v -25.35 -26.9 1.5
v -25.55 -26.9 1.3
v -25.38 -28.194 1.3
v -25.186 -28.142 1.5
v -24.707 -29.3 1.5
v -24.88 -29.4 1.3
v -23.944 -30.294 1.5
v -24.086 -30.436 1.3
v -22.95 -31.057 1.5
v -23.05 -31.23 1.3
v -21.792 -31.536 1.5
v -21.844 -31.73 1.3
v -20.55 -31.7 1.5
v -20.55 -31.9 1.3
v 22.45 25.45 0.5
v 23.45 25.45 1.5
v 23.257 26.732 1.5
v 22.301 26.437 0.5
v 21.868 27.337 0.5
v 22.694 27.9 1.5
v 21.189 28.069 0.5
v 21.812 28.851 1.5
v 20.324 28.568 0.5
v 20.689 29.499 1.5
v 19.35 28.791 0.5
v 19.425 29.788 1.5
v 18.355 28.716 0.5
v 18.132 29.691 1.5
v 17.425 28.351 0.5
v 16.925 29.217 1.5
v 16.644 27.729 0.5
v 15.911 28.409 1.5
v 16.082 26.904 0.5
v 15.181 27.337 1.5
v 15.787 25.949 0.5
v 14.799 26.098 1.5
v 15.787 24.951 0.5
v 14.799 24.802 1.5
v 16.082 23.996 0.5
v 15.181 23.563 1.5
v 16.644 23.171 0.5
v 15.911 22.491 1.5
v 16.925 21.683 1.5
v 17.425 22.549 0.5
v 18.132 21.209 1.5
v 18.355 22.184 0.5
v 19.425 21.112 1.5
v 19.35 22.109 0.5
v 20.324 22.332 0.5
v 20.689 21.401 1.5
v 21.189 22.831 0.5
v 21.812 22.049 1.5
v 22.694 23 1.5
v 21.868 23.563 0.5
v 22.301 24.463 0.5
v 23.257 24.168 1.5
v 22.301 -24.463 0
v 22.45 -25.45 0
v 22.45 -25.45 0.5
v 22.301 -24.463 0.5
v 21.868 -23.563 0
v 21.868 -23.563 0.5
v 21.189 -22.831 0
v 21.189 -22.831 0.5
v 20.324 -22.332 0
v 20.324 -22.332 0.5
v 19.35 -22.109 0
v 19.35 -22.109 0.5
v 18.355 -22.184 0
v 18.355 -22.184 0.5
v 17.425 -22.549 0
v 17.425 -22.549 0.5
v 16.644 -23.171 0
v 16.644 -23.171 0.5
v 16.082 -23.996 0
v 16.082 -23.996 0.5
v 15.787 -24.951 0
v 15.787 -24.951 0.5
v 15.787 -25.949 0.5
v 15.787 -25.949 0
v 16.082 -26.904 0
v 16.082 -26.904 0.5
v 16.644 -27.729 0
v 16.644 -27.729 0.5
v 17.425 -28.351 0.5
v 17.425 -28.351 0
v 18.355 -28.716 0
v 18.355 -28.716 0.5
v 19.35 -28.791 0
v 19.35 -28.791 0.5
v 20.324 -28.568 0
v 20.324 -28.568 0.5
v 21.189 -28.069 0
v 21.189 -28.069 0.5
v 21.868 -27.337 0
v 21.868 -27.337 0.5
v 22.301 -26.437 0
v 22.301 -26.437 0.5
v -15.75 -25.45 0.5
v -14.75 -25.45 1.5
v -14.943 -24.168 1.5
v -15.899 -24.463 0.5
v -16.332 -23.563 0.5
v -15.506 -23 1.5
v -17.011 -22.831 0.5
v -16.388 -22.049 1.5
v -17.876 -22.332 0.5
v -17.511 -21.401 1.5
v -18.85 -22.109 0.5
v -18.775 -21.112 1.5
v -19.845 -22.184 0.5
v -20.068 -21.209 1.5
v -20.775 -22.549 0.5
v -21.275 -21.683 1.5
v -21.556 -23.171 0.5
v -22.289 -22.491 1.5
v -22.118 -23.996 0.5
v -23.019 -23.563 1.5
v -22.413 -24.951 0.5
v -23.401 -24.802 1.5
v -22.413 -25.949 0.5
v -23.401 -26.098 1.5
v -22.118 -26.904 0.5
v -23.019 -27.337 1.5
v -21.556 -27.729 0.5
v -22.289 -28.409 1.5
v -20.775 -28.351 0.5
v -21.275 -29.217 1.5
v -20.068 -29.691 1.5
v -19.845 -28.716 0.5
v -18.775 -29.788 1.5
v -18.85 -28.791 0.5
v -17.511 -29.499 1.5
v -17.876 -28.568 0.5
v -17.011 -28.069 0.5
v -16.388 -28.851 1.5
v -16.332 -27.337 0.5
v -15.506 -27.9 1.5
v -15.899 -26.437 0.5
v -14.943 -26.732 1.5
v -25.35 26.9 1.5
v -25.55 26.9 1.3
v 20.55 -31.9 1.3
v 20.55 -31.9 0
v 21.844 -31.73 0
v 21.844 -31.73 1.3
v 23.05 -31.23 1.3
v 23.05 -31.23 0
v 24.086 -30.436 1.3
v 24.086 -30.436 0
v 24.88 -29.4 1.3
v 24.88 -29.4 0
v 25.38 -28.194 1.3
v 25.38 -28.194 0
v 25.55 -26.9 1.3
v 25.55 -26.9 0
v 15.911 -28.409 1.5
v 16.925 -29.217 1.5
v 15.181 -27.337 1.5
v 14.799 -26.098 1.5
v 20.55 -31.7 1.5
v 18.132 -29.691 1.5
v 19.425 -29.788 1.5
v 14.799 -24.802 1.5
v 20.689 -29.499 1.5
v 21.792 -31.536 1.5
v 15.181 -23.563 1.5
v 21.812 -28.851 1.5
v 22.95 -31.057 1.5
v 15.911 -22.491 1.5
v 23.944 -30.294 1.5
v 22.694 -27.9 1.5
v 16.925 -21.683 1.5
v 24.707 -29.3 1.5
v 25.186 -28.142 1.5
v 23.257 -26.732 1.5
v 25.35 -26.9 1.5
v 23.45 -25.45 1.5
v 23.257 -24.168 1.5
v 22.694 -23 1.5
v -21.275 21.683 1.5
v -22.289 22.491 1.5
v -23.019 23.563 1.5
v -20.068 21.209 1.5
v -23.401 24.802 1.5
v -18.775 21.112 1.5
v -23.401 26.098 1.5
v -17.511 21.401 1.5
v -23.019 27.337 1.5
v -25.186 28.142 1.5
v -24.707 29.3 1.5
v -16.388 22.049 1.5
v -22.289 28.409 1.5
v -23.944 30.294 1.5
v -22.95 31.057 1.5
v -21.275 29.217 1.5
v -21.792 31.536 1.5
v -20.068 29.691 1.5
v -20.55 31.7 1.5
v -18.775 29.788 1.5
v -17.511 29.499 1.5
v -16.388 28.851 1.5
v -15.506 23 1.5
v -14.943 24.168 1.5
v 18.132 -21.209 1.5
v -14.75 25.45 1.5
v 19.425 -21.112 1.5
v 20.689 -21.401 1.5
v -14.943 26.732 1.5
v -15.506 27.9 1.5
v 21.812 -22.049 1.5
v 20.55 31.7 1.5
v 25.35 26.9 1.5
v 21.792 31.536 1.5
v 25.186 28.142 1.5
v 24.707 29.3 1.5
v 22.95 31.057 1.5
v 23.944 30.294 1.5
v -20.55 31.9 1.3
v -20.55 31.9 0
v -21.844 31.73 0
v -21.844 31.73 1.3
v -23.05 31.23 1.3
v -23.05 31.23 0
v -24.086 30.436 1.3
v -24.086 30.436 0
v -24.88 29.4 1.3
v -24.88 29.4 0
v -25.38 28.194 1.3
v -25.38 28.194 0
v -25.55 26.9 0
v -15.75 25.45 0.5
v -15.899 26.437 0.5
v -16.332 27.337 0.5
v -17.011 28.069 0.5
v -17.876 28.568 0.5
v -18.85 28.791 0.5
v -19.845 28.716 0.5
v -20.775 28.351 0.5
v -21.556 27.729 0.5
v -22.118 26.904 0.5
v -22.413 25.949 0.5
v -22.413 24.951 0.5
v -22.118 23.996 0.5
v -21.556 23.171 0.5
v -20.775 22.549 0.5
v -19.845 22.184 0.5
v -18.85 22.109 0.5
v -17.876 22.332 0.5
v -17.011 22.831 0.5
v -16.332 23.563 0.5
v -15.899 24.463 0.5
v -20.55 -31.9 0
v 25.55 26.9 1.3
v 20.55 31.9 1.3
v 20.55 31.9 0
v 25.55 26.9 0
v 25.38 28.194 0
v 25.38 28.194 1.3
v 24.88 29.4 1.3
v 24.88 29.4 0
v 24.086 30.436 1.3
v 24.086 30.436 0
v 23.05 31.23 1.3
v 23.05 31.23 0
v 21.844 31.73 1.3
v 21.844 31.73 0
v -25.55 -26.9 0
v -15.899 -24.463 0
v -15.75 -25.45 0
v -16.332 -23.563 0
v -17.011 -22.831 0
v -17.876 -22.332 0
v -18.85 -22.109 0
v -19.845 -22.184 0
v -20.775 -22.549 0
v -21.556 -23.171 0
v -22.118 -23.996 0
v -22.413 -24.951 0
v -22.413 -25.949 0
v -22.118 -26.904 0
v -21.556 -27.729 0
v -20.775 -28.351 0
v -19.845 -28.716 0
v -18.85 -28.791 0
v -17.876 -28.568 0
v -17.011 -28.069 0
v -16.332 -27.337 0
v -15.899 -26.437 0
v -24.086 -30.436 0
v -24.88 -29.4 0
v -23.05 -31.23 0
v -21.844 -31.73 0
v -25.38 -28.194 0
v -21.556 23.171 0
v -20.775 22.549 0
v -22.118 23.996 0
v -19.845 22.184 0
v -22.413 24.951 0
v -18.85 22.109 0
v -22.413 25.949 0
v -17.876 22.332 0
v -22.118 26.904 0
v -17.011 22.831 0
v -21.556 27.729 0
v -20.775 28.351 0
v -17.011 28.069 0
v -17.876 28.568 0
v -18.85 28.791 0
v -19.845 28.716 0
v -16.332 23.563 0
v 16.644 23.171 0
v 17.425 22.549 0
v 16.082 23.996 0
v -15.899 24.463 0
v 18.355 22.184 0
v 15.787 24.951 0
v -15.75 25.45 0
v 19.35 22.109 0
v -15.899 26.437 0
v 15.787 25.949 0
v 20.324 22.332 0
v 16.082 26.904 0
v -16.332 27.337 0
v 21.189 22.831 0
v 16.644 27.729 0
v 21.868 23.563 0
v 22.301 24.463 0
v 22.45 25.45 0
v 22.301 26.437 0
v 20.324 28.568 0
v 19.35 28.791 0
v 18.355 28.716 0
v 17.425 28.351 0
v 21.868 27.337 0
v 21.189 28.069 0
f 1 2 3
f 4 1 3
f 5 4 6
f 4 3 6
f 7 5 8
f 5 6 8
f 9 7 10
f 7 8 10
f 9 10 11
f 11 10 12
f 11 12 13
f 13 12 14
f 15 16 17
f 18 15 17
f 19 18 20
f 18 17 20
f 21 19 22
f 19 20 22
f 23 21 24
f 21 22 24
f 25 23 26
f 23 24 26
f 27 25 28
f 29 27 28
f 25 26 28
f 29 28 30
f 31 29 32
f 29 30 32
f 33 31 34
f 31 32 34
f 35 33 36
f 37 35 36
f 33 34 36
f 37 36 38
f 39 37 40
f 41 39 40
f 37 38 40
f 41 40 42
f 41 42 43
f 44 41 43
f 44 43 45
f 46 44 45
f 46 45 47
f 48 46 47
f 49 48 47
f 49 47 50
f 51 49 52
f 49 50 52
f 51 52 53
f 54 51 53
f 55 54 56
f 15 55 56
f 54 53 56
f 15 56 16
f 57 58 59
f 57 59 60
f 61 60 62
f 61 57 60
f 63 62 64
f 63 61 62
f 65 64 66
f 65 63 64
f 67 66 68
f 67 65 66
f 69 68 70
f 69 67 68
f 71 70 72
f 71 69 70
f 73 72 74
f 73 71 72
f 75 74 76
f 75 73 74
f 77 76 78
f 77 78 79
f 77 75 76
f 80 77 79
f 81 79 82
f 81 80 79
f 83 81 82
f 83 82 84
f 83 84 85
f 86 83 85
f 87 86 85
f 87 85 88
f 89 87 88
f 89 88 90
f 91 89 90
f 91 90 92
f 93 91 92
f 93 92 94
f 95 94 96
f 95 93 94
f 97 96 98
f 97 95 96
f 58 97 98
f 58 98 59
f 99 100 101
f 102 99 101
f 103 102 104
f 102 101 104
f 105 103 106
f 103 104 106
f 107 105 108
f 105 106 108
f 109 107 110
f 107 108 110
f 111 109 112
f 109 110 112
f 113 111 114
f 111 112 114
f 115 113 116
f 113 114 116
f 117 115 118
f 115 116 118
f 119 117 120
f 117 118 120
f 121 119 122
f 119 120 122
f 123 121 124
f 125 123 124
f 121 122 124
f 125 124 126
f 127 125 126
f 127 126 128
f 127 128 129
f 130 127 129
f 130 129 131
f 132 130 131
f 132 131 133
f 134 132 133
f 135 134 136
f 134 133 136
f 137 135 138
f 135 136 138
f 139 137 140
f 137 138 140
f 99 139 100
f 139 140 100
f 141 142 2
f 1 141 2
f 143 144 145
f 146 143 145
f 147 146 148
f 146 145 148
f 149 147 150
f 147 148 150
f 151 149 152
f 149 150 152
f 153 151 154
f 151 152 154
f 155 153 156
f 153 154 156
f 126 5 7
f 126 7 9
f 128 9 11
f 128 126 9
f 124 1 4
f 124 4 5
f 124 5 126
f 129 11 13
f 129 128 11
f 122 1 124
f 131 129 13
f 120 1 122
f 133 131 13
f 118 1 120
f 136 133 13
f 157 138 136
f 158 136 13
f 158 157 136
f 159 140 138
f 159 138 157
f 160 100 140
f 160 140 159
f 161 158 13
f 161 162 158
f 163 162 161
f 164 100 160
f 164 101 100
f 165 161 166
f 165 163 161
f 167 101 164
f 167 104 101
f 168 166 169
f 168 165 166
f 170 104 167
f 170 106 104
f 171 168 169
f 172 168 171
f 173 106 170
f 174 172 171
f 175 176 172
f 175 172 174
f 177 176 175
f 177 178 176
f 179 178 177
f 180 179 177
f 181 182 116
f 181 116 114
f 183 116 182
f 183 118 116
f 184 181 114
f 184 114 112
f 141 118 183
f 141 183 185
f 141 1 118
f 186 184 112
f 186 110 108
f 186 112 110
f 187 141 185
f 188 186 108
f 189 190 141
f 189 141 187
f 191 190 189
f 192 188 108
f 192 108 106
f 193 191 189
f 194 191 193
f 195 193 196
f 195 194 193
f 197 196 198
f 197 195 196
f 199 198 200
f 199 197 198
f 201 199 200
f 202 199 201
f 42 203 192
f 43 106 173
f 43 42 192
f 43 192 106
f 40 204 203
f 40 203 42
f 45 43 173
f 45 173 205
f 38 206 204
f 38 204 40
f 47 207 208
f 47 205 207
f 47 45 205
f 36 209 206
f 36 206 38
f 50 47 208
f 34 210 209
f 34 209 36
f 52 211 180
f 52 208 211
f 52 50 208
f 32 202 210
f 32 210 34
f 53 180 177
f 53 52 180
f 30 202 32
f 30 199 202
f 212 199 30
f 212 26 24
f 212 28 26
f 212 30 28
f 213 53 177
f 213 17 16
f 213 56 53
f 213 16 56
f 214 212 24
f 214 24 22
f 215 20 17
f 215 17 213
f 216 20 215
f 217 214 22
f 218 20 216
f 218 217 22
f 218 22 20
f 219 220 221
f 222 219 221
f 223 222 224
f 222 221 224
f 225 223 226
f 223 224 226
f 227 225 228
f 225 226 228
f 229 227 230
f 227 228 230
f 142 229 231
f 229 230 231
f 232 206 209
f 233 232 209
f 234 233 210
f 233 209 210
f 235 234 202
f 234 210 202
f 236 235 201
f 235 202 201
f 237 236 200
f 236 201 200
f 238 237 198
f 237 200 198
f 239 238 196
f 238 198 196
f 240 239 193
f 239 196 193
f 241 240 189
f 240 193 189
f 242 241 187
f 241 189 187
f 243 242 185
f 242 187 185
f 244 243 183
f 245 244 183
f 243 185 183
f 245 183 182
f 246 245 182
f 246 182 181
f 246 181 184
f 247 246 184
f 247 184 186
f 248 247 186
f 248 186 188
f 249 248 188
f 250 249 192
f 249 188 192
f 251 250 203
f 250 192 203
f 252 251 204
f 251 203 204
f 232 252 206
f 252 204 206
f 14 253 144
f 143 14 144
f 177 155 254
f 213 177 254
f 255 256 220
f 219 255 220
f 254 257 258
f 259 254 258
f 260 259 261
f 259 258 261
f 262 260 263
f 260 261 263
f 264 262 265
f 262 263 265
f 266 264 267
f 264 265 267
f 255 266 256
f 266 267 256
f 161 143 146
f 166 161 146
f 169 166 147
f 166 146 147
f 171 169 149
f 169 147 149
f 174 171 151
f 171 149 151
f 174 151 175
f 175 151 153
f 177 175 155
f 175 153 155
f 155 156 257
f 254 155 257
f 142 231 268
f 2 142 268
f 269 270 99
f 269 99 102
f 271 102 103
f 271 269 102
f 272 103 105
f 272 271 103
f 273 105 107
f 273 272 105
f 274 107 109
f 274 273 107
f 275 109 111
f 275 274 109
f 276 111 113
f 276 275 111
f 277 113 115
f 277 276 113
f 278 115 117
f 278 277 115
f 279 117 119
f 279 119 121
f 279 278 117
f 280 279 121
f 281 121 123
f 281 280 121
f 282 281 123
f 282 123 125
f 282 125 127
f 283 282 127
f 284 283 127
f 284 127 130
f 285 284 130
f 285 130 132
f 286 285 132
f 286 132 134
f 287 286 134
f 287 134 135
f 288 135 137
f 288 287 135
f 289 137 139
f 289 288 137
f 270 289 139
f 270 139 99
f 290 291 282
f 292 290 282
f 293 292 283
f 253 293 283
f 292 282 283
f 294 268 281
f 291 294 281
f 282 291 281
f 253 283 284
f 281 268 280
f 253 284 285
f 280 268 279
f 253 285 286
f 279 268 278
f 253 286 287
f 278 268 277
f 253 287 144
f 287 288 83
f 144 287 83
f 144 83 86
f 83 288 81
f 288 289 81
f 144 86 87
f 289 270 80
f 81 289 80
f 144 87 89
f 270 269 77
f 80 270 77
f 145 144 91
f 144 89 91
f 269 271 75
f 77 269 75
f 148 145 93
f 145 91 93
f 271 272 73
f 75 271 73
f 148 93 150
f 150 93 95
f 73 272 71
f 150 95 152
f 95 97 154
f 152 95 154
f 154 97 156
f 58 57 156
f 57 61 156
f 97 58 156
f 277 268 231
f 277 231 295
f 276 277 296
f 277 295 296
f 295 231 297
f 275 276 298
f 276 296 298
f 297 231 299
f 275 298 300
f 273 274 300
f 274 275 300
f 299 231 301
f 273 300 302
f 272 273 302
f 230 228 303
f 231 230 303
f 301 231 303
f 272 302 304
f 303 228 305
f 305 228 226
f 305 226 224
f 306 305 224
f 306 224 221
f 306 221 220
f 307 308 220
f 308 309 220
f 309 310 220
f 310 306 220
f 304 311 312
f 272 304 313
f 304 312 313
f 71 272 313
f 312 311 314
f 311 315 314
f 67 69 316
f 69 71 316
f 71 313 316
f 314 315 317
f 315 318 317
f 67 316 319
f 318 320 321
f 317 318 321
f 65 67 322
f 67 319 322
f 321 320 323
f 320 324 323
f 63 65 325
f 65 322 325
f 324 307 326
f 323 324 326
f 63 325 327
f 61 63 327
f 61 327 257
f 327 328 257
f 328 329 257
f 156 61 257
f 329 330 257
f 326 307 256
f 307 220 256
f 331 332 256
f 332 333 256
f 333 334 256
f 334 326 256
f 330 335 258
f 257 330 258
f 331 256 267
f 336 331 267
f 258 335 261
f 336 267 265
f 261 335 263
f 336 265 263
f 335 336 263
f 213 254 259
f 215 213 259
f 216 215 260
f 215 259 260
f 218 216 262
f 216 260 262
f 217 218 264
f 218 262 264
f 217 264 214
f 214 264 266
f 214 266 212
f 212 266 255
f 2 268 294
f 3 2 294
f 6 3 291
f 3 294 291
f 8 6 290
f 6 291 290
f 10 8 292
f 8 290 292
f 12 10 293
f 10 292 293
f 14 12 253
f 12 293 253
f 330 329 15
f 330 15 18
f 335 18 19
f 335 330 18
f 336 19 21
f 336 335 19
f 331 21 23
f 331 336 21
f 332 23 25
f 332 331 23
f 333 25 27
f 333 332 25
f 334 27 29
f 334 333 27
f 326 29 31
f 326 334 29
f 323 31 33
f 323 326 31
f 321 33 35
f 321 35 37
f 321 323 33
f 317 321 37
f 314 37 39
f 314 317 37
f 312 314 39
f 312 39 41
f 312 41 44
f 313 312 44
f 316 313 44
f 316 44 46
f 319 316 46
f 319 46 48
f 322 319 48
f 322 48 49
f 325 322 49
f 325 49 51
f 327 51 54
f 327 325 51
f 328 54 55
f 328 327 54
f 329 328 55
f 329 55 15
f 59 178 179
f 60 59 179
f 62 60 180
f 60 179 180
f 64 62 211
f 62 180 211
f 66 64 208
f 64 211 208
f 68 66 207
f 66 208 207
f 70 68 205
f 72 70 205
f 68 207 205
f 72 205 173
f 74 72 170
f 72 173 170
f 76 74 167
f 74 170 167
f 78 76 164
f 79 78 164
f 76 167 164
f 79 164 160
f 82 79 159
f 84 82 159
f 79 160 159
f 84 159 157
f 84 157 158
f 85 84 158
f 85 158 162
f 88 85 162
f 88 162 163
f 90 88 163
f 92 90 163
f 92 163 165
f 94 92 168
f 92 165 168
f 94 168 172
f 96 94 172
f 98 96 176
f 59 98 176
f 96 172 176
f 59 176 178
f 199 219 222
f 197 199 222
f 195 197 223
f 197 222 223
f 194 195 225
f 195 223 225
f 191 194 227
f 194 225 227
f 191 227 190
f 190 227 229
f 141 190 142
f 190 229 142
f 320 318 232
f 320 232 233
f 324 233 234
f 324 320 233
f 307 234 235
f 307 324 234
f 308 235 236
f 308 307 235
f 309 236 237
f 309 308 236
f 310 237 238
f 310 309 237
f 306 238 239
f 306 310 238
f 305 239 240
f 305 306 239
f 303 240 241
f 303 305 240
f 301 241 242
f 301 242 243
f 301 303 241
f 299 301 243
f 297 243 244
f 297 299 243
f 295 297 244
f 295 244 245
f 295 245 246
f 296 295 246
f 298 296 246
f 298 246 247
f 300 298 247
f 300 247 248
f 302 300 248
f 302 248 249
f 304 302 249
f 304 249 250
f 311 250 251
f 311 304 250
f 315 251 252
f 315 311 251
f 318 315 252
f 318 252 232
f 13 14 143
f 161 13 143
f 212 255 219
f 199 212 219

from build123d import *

# Parameters (mm, degrees)
F0_R     = 3.35
F1_DEPTH = 1.5
F2_SIZE  = 1
F3_SIZE  = 0.2


with BuildPart() as f1:
    # F0 (on Top) → F1 (new body)
    with BuildSketch(Plane.XY):
        with BuildLine():
            Line((20.55, 31.9), (-20.55, 31.9))
            ThreePointArc((-20.55, 31.9), (-24.085534, 30.435534), (-25.55, 26.9))
            Line((-25.55, 26.9), (-25.55, -26.9))
            ThreePointArc((-25.55, -26.9), (-24.085534, -30.435534), (-20.55, -31.9))
            Line((-20.55, -31.9), (20.55, -31.9))
            ThreePointArc((20.55, -31.9), (24.085534, -30.435534), (25.55, -26.9))
            Line((25.55, -26.9), (25.55, 26.9))
            ThreePointArc((25.55, 26.9), (24.085534, 30.435534), (20.55, 31.9))
        make_face()
        with Locations((-19.1, -25.45)):
            Circle(F0_R, mode=Mode.SUBTRACT)
        with Locations((19.1, -25.45)):
            Circle(F0_R, mode=Mode.SUBTRACT)
        with Locations((-19.1, 25.45)):
            Circle(F0_R, mode=Mode.SUBTRACT)
        with Locations((19.1, 25.45)):
            Circle(F0_R, mode=Mode.SUBTRACT)
    extrude(amount=F1_DEPTH)

    # F2
    f2_edges = [f1.edges().sort_by_distance(p)[0] for p in [
        (-22.45, 25.45, 1.5),
        (15.75, 25.45, 1.5),
        (15.75, -25.45, 1.5),
        (-22.45, -25.45, 1.5),
    ]]
    chamfer(f2_edges, length=F2_SIZE)

    # F3
    f3_edges = [f1.edges().sort_by_distance(p)[0] for p in [
        (-24.085534, 30.435534, 1.5),
        (-25.55, 0, 1.5),
        (-24.085534, -30.435534, 1.5),
        (0, 31.9, 1.5),
        (24.085534, 30.435534, 1.5),
        (25.55, 0, 1.5),
        (24.085534, -30.435534, 1.5),
        (0, -31.9, 1.5),
    ]]
    chamfer(f3_edges, length=F3_SIZE)


solid = f1.part
